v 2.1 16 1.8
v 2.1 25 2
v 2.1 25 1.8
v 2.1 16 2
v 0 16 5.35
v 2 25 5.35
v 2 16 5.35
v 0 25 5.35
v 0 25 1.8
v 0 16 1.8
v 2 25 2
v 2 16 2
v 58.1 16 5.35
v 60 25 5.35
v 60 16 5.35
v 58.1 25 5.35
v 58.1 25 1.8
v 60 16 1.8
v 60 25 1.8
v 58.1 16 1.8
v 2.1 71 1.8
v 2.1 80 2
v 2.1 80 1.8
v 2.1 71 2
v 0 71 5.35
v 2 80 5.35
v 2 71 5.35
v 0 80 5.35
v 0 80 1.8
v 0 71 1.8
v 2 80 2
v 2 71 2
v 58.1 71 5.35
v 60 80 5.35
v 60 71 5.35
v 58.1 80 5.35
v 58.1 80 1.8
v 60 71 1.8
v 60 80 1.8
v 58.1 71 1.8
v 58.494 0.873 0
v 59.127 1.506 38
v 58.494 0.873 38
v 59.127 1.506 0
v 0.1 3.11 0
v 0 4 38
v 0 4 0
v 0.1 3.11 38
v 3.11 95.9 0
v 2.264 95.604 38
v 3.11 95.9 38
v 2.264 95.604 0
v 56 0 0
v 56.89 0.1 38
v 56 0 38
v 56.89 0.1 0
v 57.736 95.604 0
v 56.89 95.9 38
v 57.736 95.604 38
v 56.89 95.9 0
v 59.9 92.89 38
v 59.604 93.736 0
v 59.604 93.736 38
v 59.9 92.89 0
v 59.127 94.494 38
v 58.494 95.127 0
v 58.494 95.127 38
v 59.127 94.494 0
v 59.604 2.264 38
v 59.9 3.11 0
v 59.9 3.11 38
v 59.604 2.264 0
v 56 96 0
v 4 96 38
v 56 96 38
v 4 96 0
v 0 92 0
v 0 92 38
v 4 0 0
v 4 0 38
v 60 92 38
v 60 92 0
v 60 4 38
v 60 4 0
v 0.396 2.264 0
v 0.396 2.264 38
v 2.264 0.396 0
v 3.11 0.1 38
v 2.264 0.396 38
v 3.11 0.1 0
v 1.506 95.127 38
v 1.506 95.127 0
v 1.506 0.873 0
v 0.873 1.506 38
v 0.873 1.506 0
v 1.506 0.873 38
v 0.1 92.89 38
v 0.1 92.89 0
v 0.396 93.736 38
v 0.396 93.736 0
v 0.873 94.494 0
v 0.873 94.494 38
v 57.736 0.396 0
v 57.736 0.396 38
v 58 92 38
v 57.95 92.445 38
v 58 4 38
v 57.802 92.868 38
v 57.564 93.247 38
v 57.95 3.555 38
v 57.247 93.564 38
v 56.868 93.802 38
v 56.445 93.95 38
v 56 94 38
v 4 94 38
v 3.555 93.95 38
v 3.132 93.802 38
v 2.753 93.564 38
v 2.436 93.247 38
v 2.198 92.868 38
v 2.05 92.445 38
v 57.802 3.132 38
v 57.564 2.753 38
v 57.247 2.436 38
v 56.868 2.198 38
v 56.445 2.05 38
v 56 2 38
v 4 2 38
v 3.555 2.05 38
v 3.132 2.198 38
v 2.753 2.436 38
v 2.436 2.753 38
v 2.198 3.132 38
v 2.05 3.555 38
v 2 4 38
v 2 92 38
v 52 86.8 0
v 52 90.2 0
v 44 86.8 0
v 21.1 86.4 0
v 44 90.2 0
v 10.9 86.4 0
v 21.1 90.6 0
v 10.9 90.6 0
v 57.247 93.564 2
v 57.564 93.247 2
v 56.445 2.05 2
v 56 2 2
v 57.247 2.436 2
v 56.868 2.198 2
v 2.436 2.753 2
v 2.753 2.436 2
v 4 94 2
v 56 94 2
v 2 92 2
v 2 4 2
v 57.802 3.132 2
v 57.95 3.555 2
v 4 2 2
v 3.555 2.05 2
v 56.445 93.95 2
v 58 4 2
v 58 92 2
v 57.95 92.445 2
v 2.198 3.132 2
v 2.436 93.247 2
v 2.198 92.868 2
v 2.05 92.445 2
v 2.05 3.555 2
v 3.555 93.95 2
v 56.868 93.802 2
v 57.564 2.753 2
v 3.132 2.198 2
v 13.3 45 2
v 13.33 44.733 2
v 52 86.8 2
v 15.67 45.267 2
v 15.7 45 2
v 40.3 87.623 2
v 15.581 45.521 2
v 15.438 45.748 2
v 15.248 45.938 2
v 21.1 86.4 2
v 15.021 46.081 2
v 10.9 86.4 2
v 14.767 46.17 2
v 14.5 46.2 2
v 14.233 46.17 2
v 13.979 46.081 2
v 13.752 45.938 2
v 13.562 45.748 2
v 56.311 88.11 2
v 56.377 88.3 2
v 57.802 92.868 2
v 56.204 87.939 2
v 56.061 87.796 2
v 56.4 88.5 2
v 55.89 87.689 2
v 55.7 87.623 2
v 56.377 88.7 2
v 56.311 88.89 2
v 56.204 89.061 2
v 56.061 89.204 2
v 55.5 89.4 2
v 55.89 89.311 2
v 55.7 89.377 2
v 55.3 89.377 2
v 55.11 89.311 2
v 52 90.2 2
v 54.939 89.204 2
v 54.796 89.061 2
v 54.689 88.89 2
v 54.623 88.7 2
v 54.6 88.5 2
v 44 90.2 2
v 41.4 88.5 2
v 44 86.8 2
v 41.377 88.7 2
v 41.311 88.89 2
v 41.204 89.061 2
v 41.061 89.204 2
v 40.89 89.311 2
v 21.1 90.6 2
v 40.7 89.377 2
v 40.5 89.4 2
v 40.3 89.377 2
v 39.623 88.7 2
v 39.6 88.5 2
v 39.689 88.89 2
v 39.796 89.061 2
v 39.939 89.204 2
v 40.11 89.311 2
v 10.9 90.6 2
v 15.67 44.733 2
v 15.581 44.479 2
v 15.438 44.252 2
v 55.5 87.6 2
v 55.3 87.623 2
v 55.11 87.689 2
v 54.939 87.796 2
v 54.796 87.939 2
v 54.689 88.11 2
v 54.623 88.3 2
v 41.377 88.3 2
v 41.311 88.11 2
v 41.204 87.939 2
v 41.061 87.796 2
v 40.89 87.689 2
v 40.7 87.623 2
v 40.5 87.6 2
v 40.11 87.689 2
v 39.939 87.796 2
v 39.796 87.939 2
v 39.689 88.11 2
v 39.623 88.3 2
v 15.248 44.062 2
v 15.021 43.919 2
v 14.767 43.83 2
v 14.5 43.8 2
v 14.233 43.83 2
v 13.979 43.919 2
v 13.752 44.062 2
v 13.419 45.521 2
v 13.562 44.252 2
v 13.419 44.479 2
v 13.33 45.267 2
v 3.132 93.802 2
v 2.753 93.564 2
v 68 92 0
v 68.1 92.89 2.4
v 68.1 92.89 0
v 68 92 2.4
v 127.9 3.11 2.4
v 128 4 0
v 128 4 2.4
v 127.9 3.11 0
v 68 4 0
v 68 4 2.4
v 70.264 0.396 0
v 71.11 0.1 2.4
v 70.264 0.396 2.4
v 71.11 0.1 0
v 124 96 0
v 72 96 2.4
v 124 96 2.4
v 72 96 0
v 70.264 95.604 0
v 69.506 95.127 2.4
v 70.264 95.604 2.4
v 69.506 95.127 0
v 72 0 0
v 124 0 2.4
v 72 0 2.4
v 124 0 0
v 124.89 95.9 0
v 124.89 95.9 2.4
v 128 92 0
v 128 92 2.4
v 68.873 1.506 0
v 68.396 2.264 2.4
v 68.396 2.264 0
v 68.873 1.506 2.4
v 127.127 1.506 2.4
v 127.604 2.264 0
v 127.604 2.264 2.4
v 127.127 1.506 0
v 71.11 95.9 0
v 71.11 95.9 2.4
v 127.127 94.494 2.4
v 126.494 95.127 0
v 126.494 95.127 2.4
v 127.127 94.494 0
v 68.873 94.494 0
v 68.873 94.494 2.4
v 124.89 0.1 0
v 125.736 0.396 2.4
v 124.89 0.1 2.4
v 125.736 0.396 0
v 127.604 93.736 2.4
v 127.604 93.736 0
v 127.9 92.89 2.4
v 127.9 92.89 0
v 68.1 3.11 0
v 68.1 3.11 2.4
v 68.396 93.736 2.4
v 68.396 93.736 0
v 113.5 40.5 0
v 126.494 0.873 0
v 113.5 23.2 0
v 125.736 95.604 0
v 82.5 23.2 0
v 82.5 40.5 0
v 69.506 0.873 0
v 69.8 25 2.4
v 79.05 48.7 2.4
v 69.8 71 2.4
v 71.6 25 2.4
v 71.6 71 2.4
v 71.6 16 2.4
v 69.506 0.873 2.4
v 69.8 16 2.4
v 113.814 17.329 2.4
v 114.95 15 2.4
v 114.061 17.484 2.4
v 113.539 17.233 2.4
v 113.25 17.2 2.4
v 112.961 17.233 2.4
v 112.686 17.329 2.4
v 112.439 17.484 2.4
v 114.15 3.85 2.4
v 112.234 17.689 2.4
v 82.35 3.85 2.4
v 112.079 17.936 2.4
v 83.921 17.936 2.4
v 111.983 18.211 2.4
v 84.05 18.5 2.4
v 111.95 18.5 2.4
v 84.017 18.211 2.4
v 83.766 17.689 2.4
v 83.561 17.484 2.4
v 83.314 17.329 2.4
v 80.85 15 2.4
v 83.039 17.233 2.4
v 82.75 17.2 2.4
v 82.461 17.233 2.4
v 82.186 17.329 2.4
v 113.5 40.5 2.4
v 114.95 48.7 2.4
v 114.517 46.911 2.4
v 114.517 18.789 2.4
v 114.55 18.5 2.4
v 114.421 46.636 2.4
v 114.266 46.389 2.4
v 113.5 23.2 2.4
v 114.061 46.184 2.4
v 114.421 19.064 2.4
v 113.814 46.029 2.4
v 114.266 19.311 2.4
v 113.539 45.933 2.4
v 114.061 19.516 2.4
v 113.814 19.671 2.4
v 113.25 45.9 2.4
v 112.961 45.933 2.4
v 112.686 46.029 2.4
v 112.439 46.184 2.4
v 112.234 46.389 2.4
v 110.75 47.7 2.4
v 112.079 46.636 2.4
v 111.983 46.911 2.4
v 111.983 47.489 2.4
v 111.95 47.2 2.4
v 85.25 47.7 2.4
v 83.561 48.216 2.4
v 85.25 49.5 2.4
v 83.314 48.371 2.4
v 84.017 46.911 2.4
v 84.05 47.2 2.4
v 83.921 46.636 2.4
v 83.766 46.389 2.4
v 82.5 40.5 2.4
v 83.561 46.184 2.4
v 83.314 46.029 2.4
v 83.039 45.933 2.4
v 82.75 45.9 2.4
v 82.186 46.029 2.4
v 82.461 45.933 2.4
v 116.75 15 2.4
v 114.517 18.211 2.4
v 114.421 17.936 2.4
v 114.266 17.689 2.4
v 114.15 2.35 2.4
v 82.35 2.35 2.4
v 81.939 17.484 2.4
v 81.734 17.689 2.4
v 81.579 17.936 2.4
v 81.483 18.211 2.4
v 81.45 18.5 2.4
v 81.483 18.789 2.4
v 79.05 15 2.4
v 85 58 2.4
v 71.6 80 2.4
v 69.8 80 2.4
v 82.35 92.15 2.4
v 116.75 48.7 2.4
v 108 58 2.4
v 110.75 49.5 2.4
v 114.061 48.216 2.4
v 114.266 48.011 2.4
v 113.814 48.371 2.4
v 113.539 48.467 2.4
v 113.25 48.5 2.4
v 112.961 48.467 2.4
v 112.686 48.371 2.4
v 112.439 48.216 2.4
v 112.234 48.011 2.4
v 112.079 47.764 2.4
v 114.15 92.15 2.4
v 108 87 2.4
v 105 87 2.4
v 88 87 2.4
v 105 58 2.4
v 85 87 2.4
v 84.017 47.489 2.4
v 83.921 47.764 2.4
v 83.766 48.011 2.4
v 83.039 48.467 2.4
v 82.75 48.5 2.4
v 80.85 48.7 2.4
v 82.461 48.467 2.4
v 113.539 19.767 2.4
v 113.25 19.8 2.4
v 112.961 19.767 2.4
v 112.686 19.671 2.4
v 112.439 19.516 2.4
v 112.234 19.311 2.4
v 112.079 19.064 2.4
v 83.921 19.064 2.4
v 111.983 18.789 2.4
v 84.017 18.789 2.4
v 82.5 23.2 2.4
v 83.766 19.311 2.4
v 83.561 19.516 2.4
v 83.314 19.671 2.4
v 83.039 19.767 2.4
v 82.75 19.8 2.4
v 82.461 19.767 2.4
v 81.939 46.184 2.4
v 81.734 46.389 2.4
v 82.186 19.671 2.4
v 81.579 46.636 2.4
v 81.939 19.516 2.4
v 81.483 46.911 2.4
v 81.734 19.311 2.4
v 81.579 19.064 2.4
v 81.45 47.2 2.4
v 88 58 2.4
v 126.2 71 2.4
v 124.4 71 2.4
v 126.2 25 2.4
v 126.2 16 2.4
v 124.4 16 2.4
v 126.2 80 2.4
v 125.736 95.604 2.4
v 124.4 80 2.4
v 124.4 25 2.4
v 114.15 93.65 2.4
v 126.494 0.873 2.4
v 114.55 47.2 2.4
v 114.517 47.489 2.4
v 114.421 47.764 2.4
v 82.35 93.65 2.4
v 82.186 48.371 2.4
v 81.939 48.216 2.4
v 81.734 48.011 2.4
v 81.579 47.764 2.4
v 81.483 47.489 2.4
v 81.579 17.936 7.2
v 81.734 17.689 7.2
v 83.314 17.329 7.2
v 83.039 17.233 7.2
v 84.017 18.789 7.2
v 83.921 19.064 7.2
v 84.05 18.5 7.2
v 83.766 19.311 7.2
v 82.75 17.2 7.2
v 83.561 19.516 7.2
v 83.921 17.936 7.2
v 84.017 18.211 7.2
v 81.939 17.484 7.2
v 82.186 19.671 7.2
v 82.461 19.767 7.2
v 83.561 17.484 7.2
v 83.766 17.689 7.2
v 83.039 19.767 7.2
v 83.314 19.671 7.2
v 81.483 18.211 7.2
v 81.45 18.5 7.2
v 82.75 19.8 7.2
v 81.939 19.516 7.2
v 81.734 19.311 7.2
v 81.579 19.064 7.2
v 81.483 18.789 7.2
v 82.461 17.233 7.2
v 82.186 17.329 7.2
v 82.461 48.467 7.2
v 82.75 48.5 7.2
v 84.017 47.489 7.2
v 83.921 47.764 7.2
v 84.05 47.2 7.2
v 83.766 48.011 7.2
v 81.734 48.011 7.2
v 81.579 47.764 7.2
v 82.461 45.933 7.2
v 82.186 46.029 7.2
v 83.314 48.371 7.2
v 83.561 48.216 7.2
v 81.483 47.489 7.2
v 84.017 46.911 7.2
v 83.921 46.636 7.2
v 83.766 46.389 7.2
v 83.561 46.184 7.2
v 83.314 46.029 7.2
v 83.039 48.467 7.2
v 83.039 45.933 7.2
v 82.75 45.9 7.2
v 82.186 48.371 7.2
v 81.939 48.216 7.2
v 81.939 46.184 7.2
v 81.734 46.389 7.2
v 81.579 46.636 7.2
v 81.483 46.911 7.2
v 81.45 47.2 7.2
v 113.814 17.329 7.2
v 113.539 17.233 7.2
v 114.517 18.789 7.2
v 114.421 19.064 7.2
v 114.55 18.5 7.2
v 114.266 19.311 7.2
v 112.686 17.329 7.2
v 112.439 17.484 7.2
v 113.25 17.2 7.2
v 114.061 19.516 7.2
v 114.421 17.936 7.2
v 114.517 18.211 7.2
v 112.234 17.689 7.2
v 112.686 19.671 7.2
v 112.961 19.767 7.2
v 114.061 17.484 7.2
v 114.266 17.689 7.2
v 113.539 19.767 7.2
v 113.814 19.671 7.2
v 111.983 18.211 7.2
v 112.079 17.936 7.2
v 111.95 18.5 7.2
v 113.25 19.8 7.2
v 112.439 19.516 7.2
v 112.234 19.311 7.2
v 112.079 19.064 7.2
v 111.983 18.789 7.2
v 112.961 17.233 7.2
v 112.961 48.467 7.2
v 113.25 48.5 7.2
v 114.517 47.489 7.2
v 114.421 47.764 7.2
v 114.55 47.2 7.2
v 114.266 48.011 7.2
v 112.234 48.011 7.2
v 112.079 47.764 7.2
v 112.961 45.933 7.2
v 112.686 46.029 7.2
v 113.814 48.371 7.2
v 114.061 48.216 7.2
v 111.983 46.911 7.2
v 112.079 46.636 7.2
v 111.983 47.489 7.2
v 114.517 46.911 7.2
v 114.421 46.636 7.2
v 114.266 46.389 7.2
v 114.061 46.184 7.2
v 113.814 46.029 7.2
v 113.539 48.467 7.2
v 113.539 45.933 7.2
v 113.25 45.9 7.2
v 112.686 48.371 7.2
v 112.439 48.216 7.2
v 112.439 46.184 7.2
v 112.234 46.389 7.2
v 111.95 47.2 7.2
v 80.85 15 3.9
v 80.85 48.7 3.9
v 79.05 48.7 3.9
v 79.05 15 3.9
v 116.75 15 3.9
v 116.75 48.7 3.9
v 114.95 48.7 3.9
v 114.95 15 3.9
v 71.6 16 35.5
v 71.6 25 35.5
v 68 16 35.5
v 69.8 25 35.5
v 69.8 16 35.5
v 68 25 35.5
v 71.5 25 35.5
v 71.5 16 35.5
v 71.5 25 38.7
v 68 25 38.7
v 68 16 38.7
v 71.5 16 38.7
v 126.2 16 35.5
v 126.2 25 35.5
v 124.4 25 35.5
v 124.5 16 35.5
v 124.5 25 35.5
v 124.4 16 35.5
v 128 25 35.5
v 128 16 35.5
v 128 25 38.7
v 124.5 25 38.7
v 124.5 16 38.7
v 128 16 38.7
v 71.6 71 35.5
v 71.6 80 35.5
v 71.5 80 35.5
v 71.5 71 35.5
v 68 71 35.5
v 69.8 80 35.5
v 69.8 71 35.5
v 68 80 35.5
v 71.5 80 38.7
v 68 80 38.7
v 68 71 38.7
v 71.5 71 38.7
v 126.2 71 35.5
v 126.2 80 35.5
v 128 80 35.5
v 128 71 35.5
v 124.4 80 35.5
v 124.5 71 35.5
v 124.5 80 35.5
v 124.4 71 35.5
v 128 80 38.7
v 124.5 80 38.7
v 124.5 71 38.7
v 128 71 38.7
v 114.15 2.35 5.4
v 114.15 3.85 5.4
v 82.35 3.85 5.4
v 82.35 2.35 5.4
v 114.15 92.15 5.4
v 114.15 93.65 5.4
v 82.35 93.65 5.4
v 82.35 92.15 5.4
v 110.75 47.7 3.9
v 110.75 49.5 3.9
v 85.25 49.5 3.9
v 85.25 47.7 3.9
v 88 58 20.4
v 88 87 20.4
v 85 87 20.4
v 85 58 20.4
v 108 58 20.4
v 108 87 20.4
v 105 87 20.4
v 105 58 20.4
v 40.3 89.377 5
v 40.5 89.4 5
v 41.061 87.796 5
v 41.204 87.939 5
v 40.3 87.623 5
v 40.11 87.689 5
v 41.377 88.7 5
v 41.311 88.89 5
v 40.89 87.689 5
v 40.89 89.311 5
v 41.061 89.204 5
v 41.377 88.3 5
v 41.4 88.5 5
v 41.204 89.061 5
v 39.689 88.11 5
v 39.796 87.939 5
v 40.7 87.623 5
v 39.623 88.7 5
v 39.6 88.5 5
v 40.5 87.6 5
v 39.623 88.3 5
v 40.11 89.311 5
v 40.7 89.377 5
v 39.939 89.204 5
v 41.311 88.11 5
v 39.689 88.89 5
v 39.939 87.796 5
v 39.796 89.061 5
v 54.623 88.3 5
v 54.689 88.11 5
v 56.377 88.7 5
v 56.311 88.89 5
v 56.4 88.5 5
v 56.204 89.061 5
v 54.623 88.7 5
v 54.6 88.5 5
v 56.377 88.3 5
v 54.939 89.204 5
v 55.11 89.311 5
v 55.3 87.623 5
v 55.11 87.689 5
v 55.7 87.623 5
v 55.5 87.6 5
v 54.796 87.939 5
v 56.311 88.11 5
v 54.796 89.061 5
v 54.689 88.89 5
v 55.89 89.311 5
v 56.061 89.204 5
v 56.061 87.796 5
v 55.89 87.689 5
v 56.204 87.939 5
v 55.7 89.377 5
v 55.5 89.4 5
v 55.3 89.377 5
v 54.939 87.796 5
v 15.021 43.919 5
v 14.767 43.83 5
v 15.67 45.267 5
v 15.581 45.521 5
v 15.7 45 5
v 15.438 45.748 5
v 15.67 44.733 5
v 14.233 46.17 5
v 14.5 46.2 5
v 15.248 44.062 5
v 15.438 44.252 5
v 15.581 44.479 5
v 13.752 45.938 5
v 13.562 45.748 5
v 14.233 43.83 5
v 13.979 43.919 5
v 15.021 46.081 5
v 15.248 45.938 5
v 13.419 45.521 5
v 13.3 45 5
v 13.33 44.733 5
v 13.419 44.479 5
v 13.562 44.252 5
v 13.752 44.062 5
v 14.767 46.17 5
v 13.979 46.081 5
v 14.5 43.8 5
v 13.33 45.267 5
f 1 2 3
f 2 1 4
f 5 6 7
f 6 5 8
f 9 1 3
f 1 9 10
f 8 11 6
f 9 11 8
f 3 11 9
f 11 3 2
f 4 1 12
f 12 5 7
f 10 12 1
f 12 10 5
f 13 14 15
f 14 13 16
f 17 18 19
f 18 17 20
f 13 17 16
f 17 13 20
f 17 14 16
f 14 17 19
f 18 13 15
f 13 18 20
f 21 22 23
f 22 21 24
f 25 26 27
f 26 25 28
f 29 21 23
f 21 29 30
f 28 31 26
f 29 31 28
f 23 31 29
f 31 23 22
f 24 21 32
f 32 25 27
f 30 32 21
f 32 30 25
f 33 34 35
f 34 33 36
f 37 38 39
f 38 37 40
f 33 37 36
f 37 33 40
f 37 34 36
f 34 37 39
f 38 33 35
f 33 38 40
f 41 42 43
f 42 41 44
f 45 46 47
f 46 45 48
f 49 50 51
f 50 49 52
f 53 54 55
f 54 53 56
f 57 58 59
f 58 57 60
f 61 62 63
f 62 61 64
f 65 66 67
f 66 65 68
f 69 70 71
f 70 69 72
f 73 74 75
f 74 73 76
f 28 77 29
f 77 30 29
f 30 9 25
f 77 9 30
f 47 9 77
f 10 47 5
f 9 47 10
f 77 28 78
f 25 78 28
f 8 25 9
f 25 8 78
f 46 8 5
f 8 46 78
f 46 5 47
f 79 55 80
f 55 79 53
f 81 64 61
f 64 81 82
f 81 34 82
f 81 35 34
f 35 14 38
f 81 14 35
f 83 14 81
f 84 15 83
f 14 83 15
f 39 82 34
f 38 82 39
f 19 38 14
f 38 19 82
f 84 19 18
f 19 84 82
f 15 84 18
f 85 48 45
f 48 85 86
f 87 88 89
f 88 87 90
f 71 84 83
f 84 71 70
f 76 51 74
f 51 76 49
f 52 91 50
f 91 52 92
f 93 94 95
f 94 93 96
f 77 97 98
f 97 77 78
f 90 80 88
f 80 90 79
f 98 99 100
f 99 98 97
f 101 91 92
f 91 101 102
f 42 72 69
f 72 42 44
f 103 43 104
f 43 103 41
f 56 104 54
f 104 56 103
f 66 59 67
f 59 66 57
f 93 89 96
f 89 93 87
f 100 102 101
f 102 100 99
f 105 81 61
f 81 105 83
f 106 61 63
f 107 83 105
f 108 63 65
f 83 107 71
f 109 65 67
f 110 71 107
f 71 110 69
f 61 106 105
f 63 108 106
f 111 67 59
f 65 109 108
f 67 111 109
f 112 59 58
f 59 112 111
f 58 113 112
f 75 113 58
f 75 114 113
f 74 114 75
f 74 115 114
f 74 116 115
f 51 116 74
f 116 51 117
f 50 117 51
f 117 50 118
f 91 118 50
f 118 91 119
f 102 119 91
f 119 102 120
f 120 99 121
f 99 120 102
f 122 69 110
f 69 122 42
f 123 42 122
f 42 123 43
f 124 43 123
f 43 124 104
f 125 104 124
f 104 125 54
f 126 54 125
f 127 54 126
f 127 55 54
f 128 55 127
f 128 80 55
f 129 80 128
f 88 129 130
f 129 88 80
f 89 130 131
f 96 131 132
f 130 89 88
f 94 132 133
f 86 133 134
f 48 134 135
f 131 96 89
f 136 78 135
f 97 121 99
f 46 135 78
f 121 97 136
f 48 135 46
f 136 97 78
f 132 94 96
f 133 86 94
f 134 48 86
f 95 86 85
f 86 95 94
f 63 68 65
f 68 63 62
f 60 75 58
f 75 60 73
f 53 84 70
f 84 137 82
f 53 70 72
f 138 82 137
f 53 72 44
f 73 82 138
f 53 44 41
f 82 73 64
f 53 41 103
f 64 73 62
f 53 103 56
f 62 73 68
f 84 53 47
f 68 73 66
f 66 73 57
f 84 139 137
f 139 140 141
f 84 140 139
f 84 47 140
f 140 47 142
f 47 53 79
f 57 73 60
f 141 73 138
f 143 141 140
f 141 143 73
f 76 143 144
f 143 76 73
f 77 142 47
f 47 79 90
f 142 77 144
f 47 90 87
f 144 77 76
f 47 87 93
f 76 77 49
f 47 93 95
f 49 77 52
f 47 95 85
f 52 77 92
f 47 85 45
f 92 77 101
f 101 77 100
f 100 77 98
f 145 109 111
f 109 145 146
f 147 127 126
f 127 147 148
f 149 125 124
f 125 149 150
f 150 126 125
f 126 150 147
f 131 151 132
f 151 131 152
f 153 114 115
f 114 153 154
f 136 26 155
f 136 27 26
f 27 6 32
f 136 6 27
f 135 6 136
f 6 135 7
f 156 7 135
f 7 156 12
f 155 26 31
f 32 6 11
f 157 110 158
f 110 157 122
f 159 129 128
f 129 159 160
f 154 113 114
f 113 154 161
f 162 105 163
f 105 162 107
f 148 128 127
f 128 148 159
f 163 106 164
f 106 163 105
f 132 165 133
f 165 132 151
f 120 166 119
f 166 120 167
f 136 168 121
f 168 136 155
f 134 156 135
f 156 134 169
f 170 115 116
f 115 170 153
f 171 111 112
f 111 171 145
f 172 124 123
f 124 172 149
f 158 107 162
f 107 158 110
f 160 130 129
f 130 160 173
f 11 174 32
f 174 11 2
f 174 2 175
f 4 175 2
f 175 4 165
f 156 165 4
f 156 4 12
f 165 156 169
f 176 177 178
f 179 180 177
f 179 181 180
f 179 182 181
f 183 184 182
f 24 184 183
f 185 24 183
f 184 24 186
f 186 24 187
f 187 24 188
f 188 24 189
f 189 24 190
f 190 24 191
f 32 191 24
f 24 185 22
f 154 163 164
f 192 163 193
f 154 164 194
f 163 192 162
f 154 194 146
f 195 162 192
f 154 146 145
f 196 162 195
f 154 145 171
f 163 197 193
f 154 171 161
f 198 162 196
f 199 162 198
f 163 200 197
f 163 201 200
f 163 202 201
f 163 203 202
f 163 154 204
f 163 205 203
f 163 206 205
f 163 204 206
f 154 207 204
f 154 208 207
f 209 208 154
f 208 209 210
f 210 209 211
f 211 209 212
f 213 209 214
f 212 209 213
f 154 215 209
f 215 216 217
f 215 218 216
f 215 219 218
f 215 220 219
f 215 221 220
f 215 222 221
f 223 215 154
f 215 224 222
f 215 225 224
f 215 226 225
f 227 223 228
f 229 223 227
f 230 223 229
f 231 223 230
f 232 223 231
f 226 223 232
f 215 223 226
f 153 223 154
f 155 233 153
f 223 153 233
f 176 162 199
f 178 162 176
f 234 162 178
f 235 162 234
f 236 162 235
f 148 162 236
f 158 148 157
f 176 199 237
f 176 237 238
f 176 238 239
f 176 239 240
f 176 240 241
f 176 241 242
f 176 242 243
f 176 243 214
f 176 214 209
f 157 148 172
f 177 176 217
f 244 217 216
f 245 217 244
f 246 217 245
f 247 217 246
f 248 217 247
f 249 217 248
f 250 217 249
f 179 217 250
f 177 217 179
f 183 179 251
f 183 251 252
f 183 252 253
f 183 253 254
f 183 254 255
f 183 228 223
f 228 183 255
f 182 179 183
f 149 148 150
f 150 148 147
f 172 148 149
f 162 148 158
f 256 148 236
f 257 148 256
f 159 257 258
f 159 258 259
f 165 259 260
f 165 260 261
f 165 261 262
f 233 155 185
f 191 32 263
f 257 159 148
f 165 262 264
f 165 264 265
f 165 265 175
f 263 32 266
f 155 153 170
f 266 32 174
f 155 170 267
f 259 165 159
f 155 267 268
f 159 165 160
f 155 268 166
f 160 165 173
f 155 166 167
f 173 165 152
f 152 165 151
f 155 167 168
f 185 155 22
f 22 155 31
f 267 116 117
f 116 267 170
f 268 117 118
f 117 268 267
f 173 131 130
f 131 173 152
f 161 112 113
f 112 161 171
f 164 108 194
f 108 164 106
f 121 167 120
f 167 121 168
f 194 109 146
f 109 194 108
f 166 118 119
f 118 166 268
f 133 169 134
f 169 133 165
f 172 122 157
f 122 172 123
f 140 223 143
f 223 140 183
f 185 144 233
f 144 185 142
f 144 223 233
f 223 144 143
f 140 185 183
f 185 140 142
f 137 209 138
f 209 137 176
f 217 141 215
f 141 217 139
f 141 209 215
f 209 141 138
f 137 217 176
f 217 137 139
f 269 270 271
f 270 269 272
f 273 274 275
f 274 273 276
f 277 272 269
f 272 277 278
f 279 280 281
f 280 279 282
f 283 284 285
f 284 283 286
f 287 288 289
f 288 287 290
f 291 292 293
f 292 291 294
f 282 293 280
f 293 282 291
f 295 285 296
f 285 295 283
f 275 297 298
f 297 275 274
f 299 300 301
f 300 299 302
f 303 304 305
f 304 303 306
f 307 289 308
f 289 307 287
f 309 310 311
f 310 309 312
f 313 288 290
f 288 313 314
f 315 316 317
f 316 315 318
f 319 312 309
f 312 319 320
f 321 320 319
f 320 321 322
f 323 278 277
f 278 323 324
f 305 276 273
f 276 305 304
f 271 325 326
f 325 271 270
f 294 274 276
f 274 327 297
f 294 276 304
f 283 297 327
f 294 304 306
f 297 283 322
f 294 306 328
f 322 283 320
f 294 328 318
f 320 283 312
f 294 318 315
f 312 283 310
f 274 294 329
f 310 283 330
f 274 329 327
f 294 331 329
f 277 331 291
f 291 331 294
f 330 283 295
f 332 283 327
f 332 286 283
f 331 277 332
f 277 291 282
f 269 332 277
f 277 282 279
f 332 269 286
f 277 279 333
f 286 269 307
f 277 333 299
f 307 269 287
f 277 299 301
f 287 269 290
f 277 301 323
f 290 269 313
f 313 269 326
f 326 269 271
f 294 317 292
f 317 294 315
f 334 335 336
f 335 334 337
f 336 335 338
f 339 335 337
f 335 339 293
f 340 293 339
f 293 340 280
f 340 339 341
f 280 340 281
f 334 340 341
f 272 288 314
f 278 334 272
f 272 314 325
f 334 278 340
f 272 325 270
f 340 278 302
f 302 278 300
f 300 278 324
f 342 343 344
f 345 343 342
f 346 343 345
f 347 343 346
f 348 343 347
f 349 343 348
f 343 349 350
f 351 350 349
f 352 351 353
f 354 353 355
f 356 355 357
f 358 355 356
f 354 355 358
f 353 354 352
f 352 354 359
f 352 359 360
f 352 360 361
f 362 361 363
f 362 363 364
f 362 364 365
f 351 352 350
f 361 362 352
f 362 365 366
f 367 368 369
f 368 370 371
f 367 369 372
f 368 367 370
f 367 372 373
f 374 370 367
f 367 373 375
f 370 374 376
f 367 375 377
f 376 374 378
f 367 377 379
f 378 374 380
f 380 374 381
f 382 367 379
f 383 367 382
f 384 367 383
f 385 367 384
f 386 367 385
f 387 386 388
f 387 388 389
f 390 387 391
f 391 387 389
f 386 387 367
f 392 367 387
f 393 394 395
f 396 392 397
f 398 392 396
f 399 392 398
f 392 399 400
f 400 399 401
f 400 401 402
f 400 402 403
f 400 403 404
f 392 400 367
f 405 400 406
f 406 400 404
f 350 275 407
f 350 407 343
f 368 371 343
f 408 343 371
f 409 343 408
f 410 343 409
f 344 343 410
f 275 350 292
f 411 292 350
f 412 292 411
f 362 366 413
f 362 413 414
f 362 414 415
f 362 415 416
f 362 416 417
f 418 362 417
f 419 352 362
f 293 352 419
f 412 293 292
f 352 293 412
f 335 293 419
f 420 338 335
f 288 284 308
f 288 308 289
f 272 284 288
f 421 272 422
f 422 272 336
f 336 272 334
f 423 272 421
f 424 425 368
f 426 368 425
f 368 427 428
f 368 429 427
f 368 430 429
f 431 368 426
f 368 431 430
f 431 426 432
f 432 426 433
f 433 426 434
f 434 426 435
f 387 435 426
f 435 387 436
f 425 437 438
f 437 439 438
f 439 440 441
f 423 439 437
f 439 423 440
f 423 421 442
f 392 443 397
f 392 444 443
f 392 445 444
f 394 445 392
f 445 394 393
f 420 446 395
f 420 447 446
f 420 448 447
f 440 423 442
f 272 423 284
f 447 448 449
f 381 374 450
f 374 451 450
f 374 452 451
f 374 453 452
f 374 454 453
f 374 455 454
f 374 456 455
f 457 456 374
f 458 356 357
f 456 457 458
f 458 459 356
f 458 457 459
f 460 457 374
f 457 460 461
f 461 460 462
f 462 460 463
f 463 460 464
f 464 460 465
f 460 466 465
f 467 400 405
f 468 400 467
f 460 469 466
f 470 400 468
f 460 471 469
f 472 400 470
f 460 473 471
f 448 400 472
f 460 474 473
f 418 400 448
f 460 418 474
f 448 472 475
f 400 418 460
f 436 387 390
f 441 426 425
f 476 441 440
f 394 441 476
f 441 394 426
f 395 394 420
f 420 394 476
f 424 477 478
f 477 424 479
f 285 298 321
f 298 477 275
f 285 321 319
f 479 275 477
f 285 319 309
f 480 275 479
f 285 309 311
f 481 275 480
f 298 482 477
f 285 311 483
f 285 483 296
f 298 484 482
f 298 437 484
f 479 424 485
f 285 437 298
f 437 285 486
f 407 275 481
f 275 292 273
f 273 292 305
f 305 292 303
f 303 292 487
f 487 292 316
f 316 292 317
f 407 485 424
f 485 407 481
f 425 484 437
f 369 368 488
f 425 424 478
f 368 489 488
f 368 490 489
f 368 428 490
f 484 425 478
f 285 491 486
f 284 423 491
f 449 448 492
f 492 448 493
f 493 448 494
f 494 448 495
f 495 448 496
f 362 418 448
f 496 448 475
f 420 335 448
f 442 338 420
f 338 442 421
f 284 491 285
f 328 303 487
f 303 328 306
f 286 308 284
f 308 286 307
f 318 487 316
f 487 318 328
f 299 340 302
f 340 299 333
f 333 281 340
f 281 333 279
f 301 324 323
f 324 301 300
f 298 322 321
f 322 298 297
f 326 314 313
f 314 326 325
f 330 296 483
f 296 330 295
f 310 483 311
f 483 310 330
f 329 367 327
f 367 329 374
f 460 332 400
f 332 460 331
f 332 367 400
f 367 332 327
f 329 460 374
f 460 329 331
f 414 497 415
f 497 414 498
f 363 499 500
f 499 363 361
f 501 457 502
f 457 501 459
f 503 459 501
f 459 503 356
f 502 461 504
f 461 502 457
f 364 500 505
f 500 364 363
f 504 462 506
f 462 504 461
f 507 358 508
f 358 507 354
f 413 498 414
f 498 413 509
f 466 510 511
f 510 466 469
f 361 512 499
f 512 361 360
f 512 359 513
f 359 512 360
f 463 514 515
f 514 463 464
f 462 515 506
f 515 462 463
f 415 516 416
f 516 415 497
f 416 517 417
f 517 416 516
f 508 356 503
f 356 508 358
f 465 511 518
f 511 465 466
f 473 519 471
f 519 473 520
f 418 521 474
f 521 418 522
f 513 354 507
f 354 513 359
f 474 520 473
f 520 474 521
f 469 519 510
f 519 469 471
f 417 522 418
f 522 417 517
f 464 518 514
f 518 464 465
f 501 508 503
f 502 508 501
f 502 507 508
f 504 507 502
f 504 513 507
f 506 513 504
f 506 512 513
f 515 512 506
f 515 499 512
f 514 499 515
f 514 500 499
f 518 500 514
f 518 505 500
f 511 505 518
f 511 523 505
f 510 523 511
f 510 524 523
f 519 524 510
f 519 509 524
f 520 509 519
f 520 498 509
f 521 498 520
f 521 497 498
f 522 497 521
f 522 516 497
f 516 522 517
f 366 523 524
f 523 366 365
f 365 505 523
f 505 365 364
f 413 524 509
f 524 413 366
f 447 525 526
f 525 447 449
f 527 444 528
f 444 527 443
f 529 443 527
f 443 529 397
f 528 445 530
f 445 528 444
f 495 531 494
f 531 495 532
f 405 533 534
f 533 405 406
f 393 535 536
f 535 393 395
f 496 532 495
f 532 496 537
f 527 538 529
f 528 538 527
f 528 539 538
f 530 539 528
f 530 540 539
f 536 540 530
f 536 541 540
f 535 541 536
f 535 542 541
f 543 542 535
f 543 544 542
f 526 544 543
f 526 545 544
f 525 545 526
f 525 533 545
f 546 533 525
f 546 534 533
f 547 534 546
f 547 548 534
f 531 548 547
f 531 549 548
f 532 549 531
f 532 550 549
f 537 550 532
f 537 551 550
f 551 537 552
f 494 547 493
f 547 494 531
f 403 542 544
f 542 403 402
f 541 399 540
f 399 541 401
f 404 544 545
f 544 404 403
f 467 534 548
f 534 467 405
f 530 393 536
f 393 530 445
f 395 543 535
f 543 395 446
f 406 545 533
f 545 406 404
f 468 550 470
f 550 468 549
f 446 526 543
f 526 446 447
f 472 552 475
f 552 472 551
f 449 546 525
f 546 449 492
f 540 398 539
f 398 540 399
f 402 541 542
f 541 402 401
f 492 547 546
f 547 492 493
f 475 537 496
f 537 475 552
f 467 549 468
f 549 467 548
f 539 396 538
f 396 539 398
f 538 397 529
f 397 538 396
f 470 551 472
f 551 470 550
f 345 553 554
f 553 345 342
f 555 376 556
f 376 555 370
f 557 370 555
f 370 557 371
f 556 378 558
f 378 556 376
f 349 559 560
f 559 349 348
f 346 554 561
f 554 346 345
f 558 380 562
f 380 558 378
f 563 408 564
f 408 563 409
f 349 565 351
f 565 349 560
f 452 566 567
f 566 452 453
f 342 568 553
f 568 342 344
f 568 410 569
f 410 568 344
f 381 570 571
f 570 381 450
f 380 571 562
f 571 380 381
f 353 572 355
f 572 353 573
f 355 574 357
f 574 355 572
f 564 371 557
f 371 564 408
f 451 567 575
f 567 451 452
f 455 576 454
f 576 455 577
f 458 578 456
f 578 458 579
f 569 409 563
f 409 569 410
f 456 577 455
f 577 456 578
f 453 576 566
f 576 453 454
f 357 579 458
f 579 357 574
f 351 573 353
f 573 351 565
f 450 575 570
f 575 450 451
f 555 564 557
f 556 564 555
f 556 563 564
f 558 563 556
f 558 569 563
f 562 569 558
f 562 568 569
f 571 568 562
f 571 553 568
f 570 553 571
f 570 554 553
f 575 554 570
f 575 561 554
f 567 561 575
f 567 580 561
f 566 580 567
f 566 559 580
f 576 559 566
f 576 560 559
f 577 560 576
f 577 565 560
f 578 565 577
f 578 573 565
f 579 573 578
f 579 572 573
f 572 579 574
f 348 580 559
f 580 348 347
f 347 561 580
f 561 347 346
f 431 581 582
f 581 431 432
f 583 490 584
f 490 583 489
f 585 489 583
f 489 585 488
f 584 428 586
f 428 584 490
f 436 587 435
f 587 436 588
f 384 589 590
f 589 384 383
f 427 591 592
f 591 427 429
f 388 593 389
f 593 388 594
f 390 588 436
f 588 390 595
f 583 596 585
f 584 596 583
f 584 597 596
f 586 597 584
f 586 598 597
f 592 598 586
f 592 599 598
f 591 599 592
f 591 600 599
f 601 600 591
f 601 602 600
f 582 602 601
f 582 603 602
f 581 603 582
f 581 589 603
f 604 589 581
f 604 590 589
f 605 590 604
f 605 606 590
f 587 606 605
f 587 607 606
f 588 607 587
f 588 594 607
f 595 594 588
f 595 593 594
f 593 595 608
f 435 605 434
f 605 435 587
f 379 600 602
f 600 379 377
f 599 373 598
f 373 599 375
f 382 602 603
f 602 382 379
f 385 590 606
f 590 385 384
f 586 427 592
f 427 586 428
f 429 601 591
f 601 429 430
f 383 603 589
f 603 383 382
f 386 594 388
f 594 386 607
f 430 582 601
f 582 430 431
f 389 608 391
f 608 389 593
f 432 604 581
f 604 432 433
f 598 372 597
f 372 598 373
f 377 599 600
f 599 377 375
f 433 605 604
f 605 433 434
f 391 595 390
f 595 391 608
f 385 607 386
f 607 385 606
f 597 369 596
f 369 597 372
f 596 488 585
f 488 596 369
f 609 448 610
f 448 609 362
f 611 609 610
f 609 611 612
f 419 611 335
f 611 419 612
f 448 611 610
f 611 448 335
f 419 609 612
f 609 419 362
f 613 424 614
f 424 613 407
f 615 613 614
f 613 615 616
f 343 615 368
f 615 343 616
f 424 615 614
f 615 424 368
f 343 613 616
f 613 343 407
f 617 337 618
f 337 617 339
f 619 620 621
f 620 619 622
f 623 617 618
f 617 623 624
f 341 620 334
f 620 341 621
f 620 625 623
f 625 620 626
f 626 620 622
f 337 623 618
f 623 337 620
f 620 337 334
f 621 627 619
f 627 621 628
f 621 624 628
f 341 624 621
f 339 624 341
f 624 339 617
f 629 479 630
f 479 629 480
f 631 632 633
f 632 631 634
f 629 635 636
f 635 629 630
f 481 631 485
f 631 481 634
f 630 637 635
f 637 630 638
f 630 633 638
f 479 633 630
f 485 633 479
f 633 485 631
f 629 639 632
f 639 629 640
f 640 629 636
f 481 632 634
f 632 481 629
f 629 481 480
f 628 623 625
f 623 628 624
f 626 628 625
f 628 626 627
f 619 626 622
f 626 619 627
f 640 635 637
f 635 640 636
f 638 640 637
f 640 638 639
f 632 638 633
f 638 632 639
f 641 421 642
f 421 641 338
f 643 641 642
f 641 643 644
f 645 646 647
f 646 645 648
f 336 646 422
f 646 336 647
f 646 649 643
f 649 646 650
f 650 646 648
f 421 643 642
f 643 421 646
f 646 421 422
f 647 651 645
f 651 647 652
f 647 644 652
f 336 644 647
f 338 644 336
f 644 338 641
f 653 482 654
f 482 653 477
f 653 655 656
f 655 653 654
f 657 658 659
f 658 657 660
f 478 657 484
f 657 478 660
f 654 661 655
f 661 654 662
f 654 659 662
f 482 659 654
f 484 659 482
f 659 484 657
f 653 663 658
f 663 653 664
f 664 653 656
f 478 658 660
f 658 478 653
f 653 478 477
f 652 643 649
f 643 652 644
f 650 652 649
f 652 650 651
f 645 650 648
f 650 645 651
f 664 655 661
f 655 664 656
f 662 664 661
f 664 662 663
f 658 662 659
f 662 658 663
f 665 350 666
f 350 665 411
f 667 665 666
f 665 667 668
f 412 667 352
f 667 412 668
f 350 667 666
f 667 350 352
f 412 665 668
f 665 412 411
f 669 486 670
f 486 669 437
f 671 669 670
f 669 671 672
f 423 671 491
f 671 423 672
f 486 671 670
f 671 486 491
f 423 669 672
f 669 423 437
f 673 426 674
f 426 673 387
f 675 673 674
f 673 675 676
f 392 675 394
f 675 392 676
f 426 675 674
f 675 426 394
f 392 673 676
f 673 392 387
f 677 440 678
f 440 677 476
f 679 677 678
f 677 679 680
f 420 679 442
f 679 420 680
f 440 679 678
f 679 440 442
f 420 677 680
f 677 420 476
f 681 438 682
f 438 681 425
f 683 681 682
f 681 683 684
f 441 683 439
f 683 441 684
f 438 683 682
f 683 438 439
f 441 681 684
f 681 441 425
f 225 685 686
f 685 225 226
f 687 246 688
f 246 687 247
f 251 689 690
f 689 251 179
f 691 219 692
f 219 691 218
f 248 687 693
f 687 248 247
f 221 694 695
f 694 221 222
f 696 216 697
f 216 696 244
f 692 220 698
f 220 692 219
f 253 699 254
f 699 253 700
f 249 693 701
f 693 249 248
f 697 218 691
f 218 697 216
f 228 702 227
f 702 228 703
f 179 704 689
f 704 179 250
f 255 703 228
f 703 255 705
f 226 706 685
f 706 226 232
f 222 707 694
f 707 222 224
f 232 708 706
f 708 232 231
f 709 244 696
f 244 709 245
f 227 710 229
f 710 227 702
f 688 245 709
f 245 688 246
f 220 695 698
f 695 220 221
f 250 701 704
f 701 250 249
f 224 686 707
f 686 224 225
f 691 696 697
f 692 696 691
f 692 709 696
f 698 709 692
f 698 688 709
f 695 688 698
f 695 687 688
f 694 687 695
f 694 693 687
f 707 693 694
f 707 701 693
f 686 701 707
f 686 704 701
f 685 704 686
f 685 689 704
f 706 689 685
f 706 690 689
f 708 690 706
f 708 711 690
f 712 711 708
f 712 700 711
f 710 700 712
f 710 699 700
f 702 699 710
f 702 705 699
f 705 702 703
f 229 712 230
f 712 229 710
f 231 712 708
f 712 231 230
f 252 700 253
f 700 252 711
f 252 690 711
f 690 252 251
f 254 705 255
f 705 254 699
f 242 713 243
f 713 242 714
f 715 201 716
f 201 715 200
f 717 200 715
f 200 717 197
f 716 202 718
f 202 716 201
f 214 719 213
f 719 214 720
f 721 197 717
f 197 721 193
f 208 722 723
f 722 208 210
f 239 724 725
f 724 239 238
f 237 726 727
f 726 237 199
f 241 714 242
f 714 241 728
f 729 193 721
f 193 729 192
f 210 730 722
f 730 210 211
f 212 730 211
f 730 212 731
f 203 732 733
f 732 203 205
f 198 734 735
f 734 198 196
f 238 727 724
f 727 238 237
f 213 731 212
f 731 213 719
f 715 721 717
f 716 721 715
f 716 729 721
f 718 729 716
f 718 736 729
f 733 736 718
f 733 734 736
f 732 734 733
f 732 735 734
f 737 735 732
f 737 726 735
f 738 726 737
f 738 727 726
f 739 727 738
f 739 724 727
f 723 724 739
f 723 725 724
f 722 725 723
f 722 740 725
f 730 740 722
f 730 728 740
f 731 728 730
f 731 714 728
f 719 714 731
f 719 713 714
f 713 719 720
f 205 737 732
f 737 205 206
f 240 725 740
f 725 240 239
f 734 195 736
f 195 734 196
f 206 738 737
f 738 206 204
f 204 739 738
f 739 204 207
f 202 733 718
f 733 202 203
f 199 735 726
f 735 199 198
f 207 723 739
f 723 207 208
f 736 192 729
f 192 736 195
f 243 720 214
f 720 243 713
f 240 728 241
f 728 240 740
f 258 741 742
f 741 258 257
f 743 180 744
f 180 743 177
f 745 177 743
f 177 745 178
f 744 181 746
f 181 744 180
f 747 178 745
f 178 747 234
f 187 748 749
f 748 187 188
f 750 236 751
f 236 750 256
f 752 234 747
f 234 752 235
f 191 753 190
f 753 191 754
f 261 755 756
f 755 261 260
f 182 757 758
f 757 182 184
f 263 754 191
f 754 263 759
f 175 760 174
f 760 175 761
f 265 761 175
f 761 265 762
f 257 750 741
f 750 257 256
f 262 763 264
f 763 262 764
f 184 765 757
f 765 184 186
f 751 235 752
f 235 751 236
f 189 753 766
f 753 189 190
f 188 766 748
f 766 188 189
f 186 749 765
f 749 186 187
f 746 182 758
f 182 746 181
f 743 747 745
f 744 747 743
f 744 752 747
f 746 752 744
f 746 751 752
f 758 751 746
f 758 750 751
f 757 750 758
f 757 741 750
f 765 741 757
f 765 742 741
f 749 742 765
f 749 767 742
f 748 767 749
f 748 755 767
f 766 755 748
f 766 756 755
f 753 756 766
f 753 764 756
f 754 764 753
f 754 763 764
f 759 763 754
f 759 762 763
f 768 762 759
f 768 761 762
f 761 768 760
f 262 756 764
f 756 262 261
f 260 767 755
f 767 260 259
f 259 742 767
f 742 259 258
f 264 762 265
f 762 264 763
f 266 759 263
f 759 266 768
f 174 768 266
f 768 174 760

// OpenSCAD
/*
  HC Verva Litvínov OLED — snap-fit enclosure, revision A
  Units: mm.  Designed around measured/declared components:
    LiPo 855085: 85 x 50 x 8.5
    ESP32-C3 + headers/buzzer: 40 x 30 (outline; held by rails)
    SH1106 OLED module: 35.4 x 33.5
    USB-C TP4056: 20 x 15 x 5 (per supplied product image)
    SS12F15 slide switch: adjust switch_cut_* after measuring the purchased variant.

  Two printed parts only: FRONT_BEZEL and REAR_TRAY.
  No screws: four printed flex clips latch the bezel into the tray.
*/

$fn = 28;
// Default is a two-piece print plate; wrappers select a part without overwriting it.
current_part = is_undef(part) ? "print_plate" : part;  // front, rear, print_plate, or assembly
fit = 0.35;           // ABS snap clearance; tune 0.30–0.45 for the actual filament/printer
wall = 2.0;

// Overall outside dimensions. Battery dictates the 60 mm width / 96 mm height footprint.
case_w = 60;
case_h = 96;
case_d = 38;          // allows 8.5 mm LiPo + C3 headers/buzzer above it
front_t = 2.4;
corner_r = 4;

// Battery cavity: protected cell is 85 x 50 x 8.5 mm.
batt_w = 52.0;
batt_h = 87.0;
batt_t = 9.5;         // 1 mm vertical clearance; add thin foam, never compress LiPo
batt_x = (case_w - batt_w)/2;
batt_y = 4.5;

// 1.3" 7-pin OLED from the supplied mechanical drawing.
// PCB 35.50 x 33.70 mm; 4 mounting holes Ø3.00 mm, 31.50 x 29.70 mm pitch.
oled_pcb_w = 35.5;
oled_pcb_h = 33.7;
oled_view_w = 31.0;     // 29.42 mm active width + 0.58 mm assembly clearance
oled_view_h = 17.3;     // 14.70 mm active height + 0.60 mm assembly clearance
oled_y = 15;
oled_x = (case_w-oled_pcb_w)/2;
oled_hole_dia = 3.0;
oled_hole_x = 2.5;      // from each PCB side; 35.5 - 2*2 = 31.5 mm pitch
oled_hole_y = 2.5;      // from each PCB side; 33.7 - 2*2 = 29.7 mm pitch
oled_pin_dia = 2.6;     // leaves 0.4 mm radial clearance in an Ø3.0 hole
// 2.8 mm extends 1.6 mm past a nominal 1.2 mm PCB for heat staking.
oled_pin_h = 4.8;

// 2 sajtny pro ESP
translate([85, 58, front_t])
    cube([3, 29, 18]);

translate([105, 58, front_t])
    cube([3, 29, 18]);
    
// ESP32-C3 board outline supplied by user. Retained by rails, not guessed hole locations.
c3_w = 30;
c3_h = 40;
c3_x = (case_w-c3_w)/2;
c3_y = 51;
c3_board_z = batt_t + 1.2;
rail_h = 2.2;
rail_t = 1.5;

// Rear access: TP4056 Type-C module is 20 x 15 x 5 mm from supplied product image.
charge_w = 20;
charge_h = 15;
charge_x = 6;
charge_y = case_h - charge_h ;
usb_slot_w = 10.2;
usb_slot_h = 4.2;

// SS12F15 slider. The listing has several lever heights; use H4 starting point.
switch_slot_w = 8.0;
switch_slot_h = 3.4;
switch_x = case_w - 8 - switch_slot_w;
switch_y = charge_y + 5.8;

// 2 fixační piny pro vypínač – uprav si pozici podle skutečného kusu
switch_pin_d = 1.8;
switch_pin_h = 3.0;

// vlevo od vypínače
translate([switch_x - 3.5, switch_y + switch_slot_h/2, wall])
    cylinder(d=switch_pin_d, h=switch_pin_h);

// vpravo od vypínače
translate([switch_x + switch_slot_w + 3.5, switch_y + switch_slot_h/2, wall])
    cylinder(d=switch_pin_d, h=switch_pin_h);
   
   translate([14.5, 45, wall])
    cylinder(h=3, d=2.4);

    
// Snap joints: one on each side near top/bottom. The bezel is inserted from the front;
// its hooks engage low in the rear tray, on the opposite (rear) side of the joint.
clip_w = 9;
clip_h = 3.2;
clip_z = case_d - 2.5;
clip_window_z = case_d - clip_z+2.5 - clip_h;

module rounded_box(w,h,d,r=3) {
  hull() for (x=[r,w-r]) for (y=[r,h-r])
    translate([x,y,0]) cylinder(h=d,r=r);
}

module rear_tray() {
  difference() {
    rounded_box(case_w,case_h,case_d,corner_r);
    // Main interior, leaves rear floor and side walls.
    translate([wall,wall,wall]) rounded_box(case_w-2*wall,case_h-2*wall,case_d-wall+0.1,corner_r-wall);
    // Rear-face openings: USB-C charge socket and slide switch, both accessible from back.
    // The TP4056 lies flat on the inner rear wall, held by thin VHB tape.
    translate([charge_x + (charge_w-usb_slot_w)/2, charge_y + (charge_h-usb_slot_h)/2, -0.1])
      cube([usb_slot_w,usb_slot_h,wall+0.3]);
    translate([switch_x, switch_y, -0.1])
      cube([switch_slot_w,switch_slot_h,wall+0.3]);
    // Four rear-tray latching windows; hooks come from the front bezel and catch here.
    for (y=[16,case_h-16-clip_w])
      for (x=[-0.1,case_w-wall+0.1])
        translate([x,y,clip_window_z]) cube([wall+0.2,clip_w,clip_h+fit]);
  }

  // Battery is held by its close-fitting pocket plus a thin foam tape pad on the floor.
  // There are deliberately no raised battery lips: this keeps the tray support-free and
  // avoids any sharp printed feature against the LiPo pouch.

  // TP4056 is fixed vertically to the rear wall with thin VHB/foam tape, aligned with
  // the USB-C opening. A printed horizontal shelf would need a support underneath.

  // ESP32-C3 is fixed vertically to the *inside of the front bezel* below the OLED
  // using a thin insulating VHB/foam tape pad. Never tape it onto the LiPo: its
  // underside pins must remain clear of the battery pouch. No guessed mounting holes
  // or suspended rails are used, so the complete rear tray remains support-free.
}

module front_bezel() {
  difference() {
    rounded_box(case_w,case_h,front_t,corner_r);
    // OLED viewing window, centred over the module.
    translate([(case_w-oled_view_w)/2, oled_y+(oled_pcb_h-oled_view_h)/2, -0.1])
      cube([oled_view_w,oled_view_h,front_t+0.2]);
  }

// Four compliant hooks engage rear tray windows.
// aretační lišty jsou součástí víčka
translate([wall + fit+12, wall + fit, front_t])
    cube([case_w - 12*(wall + fit), 1.5, 3]);

translate([wall + fit+12, case_h - wall - fit - 1.5, front_t])
    cube([case_w - 12*(wall + fit), 1.5, 3]);
  
  // Four Ø2.2 heat-stake pins pass through the OLED's 4 × Ø3.0 mounting holes.
  // They start at the bezel's inner face; melt only the top 0.8–1.0 mm after dry-fitting.
  for (px=[oled_hole_x, oled_pcb_w-oled_hole_x])
    for (py=[oled_hole_y, oled_pcb_h-oled_hole_y])
      translate([oled_x+px, oled_y+py+1, front_t])
        cylinder(h=oled_pin_h, d=oled_pin_dia);

  // Edge guides centre the PCB during assembly; the heat-stake pins provide retention.
  for (x=[oled_x-1.2, oled_x+oled_pcb_w-0.8])
    translate([x,oled_y,front_t]) cube([1.8,oled_pcb_h,1.5]);
  //translate([oled_x,oled_y-0.8,front_t]) cube([oled_pcb_w,1.8,1.5]);
  translate([oled_x+5,oled_y+oled_pcb_h-1.0,front_t]) cube([oled_pcb_w-10,1.8,1.5]);

  // Four compliant hooks engage rear tray windows. Print front face down.
  for (y=[16,case_h-16-clip_w]) {
    translate([wall-0.2,y,front_t]) cube([1.8,clip_w,clip_z-front_t]);
    translate([case_w-wall-1.6,y,front_t]) cube([1.8,clip_w,clip_z-front_t]);
    translate([0,y,clip_z]) cube([wall+1.5,clip_w,clip_h]);
    translate([case_w-wall-1.5,y,clip_z]) cube([wall+1.5,clip_w,clip_h]);
  }
}

if (current_part == "rear") rear_tray();
else if (current_part == "front") front_bezel();
else if (current_part == "print_plate") {
  // Two physically separate parts, 8 mm apart, both in their support-free print orientation.
  rear_tray();
  translate([case_w+8,0,0]) front_bezel();
}
else if (current_part == "assembly") {
  // Visual assembly only — never use this mode to export a printable STL.
  rear_tray();
  translate([0,case_h,case_d]) rotate([180,0,0]) front_bezel();
}
else assert(false, str("Unknown part: ", current_part, "; use front, rear, print_plate, or assembly"));
